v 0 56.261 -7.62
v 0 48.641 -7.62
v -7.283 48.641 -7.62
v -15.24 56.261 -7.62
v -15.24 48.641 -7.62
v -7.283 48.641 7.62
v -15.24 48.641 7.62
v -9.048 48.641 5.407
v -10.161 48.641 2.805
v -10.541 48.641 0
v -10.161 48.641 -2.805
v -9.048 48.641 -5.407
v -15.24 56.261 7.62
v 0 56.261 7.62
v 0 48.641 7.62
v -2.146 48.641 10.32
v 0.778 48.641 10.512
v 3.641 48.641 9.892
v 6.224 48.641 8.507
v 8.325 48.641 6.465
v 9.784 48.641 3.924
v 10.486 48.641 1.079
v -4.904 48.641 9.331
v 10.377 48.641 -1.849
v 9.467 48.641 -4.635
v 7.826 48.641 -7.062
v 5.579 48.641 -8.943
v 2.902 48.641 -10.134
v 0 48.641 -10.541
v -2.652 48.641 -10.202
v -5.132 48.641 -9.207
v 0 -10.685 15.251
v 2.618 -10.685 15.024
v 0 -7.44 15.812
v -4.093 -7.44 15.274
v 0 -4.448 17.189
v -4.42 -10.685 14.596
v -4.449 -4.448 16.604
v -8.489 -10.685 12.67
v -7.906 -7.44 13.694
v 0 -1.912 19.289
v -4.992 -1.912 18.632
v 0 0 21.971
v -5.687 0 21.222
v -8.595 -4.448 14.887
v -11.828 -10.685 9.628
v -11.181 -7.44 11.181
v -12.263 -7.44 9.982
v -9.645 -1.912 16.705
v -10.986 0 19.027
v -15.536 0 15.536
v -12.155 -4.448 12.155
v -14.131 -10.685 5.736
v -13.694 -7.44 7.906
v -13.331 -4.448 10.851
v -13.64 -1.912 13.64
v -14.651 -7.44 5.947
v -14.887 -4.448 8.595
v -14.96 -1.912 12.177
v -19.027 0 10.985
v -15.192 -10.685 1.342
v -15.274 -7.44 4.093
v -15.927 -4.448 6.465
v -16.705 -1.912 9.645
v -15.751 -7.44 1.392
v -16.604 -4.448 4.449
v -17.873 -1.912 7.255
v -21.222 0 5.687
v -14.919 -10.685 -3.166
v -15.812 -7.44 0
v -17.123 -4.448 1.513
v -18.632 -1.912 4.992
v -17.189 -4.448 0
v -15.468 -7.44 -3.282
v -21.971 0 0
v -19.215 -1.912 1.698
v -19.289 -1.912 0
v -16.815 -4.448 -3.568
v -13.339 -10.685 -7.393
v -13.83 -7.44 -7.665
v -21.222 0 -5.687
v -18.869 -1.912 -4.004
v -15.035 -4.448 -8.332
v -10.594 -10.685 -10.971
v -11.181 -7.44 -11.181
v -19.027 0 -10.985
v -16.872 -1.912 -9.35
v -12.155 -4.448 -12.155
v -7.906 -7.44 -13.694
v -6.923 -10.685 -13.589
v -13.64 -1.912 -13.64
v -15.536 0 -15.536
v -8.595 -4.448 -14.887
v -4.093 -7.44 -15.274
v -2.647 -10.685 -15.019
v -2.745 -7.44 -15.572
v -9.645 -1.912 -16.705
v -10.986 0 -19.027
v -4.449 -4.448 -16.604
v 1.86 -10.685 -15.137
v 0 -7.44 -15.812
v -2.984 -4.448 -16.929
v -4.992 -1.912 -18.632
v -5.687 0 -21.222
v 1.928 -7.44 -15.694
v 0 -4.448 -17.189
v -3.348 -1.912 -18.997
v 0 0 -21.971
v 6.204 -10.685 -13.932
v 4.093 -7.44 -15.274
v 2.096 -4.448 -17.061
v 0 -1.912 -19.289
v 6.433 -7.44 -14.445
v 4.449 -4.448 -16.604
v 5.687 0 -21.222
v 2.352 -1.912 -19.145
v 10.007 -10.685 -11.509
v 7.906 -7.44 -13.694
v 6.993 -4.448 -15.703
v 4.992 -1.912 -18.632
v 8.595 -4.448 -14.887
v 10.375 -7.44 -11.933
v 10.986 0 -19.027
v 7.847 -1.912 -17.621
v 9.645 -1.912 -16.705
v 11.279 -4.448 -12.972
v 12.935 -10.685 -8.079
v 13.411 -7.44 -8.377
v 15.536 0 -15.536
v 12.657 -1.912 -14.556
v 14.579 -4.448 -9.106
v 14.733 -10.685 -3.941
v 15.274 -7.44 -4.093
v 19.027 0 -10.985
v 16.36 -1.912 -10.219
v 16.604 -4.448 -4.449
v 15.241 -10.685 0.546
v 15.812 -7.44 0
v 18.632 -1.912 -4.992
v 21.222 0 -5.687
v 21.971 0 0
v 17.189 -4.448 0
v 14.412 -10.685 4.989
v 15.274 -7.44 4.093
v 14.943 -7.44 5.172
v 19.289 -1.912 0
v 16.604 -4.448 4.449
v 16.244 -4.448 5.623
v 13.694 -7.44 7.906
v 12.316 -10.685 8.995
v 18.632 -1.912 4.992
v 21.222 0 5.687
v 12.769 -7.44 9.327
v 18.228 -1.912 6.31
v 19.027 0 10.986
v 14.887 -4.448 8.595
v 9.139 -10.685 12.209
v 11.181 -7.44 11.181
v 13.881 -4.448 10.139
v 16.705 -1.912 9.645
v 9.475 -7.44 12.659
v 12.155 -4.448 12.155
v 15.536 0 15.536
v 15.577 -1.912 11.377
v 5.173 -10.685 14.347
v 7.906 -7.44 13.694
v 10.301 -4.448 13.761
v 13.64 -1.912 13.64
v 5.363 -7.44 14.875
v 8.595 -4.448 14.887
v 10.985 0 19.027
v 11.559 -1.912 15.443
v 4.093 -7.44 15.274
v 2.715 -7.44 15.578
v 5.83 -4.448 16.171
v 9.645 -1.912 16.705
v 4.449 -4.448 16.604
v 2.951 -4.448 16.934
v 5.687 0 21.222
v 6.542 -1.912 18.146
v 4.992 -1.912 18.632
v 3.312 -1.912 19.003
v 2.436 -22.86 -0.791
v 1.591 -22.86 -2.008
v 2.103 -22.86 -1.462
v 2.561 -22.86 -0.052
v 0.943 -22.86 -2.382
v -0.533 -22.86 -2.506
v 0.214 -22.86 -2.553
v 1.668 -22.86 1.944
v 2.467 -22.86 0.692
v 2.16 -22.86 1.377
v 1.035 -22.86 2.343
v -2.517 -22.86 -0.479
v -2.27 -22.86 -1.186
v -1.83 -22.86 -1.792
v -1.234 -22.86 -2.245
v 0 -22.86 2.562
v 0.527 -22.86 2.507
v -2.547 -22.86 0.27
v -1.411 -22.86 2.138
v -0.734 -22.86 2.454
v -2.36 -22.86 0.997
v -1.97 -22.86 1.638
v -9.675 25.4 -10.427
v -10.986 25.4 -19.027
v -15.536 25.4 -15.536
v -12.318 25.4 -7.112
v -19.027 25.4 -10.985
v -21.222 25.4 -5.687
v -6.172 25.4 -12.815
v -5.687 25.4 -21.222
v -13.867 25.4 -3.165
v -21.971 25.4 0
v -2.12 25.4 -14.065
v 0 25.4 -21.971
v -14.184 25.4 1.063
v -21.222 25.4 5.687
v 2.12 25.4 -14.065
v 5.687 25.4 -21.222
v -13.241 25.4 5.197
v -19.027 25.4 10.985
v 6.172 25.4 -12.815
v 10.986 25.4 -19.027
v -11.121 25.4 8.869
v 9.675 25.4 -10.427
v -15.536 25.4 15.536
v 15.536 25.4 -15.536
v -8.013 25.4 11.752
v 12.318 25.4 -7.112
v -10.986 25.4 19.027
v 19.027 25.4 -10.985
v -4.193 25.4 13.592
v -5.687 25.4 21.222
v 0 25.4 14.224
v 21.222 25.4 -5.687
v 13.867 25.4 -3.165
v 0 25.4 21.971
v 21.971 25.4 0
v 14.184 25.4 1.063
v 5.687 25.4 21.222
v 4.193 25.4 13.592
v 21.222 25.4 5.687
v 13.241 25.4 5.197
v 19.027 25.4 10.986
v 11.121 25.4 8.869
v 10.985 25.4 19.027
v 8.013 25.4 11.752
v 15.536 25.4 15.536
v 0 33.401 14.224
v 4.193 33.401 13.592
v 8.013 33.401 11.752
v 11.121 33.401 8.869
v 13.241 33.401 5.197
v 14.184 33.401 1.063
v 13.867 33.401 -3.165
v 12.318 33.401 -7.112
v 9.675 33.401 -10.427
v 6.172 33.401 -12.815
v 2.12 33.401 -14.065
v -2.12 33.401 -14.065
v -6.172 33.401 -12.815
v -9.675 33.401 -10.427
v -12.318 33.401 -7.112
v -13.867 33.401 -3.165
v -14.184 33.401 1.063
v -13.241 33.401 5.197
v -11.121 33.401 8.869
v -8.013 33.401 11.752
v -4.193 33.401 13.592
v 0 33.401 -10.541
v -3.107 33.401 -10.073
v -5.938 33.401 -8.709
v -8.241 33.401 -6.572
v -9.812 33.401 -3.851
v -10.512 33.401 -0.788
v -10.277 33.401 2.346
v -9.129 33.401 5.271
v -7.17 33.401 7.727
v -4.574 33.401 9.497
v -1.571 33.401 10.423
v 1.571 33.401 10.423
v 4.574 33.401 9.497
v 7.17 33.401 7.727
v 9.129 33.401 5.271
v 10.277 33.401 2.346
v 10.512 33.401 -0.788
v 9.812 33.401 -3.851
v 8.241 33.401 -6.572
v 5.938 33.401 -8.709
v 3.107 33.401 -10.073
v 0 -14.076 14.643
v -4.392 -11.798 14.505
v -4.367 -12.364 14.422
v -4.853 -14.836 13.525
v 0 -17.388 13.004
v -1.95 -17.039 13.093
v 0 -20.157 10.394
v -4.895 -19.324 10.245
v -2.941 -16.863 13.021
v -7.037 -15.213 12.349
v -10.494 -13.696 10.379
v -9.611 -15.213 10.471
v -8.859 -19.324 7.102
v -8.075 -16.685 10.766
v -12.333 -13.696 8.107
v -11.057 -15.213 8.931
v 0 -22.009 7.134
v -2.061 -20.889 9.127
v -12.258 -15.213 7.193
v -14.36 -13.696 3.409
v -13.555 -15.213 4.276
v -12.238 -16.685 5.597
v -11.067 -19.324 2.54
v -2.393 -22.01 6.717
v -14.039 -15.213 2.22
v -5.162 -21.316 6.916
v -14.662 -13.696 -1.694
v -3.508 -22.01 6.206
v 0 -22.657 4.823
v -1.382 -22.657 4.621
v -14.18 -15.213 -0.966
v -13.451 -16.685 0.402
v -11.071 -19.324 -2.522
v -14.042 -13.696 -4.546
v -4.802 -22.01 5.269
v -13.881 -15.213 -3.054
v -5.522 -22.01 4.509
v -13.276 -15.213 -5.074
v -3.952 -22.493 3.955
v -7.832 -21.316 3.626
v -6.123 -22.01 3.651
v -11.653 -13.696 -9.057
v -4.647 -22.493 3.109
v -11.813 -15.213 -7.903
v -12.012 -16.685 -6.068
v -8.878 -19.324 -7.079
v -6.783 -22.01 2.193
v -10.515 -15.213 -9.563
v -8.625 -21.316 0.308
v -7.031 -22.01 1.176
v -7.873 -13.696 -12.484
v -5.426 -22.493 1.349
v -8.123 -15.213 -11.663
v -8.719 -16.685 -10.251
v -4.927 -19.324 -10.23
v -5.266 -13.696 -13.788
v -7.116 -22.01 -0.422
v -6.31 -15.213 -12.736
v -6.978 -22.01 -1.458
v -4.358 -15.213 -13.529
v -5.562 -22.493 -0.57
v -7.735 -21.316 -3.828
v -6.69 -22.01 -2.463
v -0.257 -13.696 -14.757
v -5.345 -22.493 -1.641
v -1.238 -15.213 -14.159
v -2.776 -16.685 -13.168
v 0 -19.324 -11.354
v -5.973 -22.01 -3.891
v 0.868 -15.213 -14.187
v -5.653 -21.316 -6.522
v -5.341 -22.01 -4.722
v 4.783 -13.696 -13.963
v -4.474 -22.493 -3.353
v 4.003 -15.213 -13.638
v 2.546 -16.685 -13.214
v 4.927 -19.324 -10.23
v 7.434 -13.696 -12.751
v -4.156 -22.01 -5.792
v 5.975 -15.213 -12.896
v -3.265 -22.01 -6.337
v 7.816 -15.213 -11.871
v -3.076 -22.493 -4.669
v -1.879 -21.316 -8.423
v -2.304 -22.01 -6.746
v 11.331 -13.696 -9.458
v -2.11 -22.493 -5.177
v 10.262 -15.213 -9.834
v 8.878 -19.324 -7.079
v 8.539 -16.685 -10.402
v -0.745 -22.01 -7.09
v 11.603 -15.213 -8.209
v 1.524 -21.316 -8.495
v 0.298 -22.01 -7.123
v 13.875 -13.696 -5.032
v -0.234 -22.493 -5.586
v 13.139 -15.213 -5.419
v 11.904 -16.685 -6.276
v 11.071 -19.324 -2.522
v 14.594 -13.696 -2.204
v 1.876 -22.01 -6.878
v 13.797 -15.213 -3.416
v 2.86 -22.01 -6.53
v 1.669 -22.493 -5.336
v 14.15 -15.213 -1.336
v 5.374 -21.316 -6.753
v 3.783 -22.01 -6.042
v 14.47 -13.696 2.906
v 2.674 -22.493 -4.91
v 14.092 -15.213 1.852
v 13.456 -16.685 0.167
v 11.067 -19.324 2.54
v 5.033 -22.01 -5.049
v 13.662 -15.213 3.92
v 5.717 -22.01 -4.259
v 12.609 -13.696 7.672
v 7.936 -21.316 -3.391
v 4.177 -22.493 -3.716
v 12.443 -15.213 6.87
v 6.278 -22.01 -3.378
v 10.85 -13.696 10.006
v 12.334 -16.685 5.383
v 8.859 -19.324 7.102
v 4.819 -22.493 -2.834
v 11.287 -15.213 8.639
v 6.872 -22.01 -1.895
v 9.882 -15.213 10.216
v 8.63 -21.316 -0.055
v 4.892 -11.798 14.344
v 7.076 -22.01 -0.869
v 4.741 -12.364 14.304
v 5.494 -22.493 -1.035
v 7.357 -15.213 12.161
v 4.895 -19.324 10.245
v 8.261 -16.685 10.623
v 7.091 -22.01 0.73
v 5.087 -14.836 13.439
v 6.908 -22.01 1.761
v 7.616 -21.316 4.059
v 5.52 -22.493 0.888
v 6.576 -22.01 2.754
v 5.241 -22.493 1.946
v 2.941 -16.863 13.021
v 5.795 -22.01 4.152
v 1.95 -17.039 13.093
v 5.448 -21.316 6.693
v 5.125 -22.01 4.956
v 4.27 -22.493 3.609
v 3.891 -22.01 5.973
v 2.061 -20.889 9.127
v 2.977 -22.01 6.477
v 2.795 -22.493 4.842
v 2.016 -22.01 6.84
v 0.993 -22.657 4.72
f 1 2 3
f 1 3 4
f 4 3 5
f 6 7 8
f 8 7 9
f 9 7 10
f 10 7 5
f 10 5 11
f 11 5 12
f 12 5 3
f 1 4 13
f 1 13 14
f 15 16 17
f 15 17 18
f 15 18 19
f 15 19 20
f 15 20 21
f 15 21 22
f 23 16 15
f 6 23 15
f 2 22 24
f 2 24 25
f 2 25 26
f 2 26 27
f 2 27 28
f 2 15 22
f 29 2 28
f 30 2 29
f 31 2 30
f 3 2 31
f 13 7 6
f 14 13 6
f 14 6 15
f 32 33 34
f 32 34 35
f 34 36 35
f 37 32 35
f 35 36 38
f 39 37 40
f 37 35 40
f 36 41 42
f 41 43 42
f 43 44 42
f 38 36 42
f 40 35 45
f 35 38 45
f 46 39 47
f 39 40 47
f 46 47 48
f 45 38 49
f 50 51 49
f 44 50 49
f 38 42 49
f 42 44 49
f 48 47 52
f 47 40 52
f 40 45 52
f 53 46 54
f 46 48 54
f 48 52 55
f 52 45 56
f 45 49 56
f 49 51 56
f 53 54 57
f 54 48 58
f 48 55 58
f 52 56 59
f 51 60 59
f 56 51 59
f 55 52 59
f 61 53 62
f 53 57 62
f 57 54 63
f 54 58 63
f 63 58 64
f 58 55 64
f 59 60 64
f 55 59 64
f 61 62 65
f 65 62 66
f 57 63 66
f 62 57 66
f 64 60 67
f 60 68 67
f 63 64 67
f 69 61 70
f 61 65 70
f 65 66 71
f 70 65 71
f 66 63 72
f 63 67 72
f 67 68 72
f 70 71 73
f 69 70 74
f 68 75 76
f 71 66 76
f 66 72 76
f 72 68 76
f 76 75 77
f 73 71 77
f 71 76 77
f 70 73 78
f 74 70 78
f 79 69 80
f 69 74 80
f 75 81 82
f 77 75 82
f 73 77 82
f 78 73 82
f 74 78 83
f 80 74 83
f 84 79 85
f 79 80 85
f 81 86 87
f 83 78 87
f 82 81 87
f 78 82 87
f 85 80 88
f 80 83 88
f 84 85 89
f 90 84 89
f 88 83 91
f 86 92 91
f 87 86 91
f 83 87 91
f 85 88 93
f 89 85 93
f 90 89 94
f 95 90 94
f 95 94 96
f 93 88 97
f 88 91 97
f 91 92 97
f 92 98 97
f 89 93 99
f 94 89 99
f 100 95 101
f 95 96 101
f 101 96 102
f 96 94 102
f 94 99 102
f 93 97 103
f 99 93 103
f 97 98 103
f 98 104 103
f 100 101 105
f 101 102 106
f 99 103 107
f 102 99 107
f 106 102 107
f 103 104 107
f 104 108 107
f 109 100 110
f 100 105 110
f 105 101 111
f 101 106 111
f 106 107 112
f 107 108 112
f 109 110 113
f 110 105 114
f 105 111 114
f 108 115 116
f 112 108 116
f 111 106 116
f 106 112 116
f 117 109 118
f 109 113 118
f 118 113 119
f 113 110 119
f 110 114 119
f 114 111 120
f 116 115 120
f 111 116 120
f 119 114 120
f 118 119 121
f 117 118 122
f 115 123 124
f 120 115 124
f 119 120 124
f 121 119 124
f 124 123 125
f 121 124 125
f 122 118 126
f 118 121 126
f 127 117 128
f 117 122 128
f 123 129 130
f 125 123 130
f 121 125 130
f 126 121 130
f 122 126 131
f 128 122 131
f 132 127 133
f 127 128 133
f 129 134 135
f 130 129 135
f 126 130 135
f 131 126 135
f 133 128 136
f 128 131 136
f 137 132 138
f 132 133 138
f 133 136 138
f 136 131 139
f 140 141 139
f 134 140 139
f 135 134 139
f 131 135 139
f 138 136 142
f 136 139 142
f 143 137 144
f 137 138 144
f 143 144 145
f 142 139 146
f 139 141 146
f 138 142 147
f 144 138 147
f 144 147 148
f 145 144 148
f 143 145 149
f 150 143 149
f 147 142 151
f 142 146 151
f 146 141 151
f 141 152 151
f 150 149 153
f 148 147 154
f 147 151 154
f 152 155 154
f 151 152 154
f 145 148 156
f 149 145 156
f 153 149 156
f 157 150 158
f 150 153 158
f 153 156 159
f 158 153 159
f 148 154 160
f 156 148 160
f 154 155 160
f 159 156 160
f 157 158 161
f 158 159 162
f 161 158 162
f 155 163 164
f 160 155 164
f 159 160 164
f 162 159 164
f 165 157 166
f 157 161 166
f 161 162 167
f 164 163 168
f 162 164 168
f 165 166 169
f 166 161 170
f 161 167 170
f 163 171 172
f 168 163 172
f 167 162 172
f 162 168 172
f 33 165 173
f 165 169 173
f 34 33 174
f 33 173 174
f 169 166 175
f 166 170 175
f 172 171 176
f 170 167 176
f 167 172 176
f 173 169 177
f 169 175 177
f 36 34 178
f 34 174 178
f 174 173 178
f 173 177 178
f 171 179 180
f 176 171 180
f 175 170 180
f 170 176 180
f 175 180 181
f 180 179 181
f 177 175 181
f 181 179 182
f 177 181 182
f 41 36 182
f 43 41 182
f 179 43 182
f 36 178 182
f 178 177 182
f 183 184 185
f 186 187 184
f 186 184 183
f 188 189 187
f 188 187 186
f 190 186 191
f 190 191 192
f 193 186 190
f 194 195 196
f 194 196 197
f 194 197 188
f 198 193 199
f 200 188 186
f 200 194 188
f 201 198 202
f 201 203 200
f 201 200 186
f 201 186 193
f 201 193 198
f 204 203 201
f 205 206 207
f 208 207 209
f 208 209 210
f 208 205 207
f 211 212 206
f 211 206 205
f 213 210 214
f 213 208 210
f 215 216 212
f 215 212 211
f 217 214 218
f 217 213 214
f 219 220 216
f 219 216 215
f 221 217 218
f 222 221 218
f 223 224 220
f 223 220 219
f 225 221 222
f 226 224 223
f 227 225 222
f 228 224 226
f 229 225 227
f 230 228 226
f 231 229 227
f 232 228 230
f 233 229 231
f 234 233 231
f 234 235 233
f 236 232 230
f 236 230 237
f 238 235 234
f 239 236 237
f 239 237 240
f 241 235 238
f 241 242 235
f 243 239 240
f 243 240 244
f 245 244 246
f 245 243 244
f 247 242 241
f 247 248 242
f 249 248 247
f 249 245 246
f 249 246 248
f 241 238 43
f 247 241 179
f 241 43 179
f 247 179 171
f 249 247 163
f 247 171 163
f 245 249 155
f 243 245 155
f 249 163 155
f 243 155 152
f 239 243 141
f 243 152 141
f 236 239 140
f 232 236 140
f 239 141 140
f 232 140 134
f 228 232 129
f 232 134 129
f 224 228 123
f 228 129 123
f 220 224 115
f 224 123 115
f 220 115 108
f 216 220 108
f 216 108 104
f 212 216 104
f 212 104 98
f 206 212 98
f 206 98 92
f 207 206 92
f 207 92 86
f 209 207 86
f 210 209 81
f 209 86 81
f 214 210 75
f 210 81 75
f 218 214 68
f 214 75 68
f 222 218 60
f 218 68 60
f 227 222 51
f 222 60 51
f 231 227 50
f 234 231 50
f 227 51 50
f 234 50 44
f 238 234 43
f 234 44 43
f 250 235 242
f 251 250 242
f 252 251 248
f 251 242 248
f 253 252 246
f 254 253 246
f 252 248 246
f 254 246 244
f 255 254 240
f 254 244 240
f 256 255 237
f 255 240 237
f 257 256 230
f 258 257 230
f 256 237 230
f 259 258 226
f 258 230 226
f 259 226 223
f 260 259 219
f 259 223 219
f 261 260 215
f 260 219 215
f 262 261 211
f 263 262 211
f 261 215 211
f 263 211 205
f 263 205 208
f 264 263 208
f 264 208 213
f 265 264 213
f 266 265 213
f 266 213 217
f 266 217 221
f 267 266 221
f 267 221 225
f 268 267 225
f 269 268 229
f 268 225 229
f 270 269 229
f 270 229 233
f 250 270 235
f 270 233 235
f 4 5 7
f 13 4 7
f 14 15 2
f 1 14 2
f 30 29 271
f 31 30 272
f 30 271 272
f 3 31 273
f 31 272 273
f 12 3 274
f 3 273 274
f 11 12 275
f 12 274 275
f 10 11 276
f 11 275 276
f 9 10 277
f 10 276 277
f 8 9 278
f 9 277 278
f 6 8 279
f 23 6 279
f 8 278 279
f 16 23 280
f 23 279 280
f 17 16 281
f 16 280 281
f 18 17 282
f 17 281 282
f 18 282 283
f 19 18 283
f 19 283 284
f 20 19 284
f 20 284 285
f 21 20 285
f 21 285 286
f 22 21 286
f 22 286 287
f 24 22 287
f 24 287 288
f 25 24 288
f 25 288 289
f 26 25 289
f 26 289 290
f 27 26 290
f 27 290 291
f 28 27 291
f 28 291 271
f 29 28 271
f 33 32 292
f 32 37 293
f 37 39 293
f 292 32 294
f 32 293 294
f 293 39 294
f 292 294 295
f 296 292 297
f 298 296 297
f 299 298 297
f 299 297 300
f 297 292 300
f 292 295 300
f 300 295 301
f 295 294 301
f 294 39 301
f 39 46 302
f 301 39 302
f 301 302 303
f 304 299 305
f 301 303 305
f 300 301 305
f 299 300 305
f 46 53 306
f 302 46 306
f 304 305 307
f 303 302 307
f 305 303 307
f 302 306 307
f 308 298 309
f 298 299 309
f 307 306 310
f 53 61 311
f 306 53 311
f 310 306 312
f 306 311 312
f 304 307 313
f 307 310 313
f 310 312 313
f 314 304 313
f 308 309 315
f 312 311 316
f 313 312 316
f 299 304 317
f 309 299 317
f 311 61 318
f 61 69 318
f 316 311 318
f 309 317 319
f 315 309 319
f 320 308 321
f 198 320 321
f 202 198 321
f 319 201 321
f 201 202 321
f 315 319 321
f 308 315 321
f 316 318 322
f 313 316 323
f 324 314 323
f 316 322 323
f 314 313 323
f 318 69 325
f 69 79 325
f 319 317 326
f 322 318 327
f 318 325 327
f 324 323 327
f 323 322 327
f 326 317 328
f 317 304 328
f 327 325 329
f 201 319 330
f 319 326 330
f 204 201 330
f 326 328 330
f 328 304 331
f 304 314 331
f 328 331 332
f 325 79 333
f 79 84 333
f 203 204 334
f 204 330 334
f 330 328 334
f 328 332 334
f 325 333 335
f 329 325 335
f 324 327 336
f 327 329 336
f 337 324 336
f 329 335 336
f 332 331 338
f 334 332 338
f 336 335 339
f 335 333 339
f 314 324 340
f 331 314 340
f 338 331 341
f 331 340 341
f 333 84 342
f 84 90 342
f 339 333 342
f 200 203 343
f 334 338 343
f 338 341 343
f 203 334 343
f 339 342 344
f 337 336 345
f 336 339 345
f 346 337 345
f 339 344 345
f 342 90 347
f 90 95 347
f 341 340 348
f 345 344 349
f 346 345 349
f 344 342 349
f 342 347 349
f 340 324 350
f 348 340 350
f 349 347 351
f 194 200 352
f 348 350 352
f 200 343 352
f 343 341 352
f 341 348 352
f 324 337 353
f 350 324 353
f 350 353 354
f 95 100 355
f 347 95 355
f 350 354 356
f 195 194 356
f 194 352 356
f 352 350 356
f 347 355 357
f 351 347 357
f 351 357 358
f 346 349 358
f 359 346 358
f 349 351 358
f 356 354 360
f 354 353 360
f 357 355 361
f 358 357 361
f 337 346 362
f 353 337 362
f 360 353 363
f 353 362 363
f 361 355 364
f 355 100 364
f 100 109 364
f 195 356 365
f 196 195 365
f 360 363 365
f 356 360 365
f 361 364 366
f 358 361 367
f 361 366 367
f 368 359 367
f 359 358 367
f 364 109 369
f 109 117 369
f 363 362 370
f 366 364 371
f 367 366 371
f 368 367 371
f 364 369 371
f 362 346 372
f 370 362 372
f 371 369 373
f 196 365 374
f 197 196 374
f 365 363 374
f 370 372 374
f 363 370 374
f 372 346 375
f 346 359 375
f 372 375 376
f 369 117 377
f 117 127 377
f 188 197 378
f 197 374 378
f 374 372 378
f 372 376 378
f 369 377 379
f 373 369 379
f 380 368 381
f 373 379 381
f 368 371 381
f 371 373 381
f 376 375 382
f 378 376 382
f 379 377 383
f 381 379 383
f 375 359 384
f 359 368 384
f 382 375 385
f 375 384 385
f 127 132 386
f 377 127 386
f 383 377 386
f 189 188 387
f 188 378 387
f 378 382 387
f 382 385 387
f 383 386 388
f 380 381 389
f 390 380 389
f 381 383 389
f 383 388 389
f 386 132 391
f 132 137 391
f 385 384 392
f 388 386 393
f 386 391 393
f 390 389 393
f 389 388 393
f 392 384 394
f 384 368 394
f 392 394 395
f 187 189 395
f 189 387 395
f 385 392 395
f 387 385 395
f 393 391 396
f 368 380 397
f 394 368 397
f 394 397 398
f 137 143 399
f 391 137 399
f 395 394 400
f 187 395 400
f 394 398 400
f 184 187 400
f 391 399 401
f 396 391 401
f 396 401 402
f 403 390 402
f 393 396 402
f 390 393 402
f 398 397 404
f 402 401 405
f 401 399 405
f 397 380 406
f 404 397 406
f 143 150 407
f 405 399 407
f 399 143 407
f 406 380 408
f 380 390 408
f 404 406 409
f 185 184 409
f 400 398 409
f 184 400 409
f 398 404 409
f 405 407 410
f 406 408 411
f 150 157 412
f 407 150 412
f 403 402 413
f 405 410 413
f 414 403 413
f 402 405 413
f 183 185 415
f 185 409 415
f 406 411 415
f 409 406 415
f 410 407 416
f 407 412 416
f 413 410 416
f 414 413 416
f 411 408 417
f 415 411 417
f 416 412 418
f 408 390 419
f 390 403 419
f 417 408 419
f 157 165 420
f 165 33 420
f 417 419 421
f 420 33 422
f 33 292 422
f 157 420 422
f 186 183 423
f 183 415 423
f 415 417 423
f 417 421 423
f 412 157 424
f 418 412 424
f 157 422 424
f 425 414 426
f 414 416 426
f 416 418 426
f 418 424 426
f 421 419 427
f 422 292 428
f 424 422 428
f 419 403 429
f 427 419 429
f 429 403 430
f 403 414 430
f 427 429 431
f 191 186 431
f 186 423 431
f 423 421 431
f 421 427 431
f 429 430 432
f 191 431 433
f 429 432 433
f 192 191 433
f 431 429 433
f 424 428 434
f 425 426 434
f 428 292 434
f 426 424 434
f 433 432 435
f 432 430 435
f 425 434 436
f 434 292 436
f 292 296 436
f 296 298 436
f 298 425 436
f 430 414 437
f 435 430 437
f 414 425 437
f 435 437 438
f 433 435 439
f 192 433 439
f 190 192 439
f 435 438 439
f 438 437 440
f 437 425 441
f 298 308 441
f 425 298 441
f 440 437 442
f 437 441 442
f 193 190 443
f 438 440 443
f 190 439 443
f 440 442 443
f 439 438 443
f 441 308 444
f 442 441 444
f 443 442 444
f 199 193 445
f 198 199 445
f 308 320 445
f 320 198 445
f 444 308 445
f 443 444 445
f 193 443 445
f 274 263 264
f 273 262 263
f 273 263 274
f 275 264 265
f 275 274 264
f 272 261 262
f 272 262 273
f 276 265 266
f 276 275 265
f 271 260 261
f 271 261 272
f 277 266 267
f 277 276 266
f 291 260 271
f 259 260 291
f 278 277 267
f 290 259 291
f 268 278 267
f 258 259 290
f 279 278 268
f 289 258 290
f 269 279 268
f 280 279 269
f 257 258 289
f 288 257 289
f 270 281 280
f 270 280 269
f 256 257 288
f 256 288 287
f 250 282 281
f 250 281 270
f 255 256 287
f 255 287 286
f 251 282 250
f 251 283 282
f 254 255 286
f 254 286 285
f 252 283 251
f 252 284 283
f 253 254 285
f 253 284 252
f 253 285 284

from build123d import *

# Parameters (mm, degrees)
SKETCH1_R           = 21.971
BOSS_EXTRUDE1_DEPTH = 25.4
SKETCH2_R           = 14.224
BOSS_EXTRUDE2_DEPTH = 8.001
SKETCH3_R           = 10.541
BOSS_EXTRUDE3_DEPTH = 15.24
BOSS_EXTRUDE4_DEPTH = 7.62
SKETCH5_R           = 15.24
BOSS_EXTRUDE5_DEPTH = 22.86
FILLET1_R           = 12.7
FILLET2_R           = 12.7


with BuildPart() as part:
    # Sketch1 → Boss-Extrude1 (new body)
    with BuildSketch(Plane(origin=(0, 0, 0), x_dir=(1, 0, 0), z_dir=(0, 1, 0))):
        with Locations(Location((0, 0, 0), (0, 0, 270))):
            Circle(SKETCH1_R)
    extrude(amount=BOSS_EXTRUDE1_DEPTH)

    # Sketch2 → Boss-Extrude2 (add)
    with BuildSketch(Plane(origin=(0, 25.4, 0), x_dir=(1, 0, 0), z_dir=(0, 1, 0))):
        with Locations(Location((0, 0, 0), (0, 0, 270))):
            Circle(SKETCH2_R)
    extrude(amount=BOSS_EXTRUDE2_DEPTH)

    # Sketch3 → Boss-Extrude3 (add)
    with BuildSketch(Plane(origin=(0, 33.401, 0), x_dir=(1, 0, 0), z_dir=(0, 1, 0))):
        with Locations(Location((0, 0, 0), (0, 0, 90))):
            Circle(SKETCH3_R)
    extrude(amount=BOSS_EXTRUDE3_DEPTH)

    # Sketch4 → Boss-Extrude4 (add)
    with BuildSketch(Plane(origin=(0, 48.641, 0), x_dir=(1, 0, 0), z_dir=(0, 1, 0))):
        Polygon((0, 0), (0, 7.62), (-15.24, 7.62), (-15.24, 0), (-15.24, -7.62), (0, -7.62), align=None)
    extrude(amount=BOSS_EXTRUDE4_DEPTH)

    # Sketch5 → Boss-Extrude5 (add)
    with BuildSketch(Plane.XZ):
        with Locations(Location((0, 0, 0), (0, 0, 90))):
            Circle(SKETCH5_R)
    extrude(amount=BOSS_EXTRUDE5_DEPTH)

    # Fillet1
    # the kernel refuses this fillet: 12.7 mm, written as the material it adds along each edge
    with BuildSketch(Plane(origin=(0, 0, 0), x_dir=(0, 0, 1), z_dir=(1, 0, 0))) as fillet1_piece_1:
        with BuildLine():
            CenterArc((27.94, 11.209863469), FILLET1_R, 180, 61.965703465)
            Line((15.24, 11.209863469), (14.986, 11.209863469))
            Line((14.986, 11.209863469), (14.986, 0))
            Line((14.986, 0), (15.24, -0.254))
            ThreePointArc((15.24, -0.254), (18.6055, -0.254), (21.85162, -0.224197269))
            Line((21.85162, -0.224197269), (21.971, 0))
        make_face()
    revolve(axis=Axis((0, 0, 0), (0, -1, 0)))

    # Fillet2
    fillet2_edges = [part.edges().sort_by_distance(p)[0] for p in [
        (0, -22.86, -15.24),
    ]]
    fillet(fillet2_edges, radius=FILLET2_R)


solid = part.part
